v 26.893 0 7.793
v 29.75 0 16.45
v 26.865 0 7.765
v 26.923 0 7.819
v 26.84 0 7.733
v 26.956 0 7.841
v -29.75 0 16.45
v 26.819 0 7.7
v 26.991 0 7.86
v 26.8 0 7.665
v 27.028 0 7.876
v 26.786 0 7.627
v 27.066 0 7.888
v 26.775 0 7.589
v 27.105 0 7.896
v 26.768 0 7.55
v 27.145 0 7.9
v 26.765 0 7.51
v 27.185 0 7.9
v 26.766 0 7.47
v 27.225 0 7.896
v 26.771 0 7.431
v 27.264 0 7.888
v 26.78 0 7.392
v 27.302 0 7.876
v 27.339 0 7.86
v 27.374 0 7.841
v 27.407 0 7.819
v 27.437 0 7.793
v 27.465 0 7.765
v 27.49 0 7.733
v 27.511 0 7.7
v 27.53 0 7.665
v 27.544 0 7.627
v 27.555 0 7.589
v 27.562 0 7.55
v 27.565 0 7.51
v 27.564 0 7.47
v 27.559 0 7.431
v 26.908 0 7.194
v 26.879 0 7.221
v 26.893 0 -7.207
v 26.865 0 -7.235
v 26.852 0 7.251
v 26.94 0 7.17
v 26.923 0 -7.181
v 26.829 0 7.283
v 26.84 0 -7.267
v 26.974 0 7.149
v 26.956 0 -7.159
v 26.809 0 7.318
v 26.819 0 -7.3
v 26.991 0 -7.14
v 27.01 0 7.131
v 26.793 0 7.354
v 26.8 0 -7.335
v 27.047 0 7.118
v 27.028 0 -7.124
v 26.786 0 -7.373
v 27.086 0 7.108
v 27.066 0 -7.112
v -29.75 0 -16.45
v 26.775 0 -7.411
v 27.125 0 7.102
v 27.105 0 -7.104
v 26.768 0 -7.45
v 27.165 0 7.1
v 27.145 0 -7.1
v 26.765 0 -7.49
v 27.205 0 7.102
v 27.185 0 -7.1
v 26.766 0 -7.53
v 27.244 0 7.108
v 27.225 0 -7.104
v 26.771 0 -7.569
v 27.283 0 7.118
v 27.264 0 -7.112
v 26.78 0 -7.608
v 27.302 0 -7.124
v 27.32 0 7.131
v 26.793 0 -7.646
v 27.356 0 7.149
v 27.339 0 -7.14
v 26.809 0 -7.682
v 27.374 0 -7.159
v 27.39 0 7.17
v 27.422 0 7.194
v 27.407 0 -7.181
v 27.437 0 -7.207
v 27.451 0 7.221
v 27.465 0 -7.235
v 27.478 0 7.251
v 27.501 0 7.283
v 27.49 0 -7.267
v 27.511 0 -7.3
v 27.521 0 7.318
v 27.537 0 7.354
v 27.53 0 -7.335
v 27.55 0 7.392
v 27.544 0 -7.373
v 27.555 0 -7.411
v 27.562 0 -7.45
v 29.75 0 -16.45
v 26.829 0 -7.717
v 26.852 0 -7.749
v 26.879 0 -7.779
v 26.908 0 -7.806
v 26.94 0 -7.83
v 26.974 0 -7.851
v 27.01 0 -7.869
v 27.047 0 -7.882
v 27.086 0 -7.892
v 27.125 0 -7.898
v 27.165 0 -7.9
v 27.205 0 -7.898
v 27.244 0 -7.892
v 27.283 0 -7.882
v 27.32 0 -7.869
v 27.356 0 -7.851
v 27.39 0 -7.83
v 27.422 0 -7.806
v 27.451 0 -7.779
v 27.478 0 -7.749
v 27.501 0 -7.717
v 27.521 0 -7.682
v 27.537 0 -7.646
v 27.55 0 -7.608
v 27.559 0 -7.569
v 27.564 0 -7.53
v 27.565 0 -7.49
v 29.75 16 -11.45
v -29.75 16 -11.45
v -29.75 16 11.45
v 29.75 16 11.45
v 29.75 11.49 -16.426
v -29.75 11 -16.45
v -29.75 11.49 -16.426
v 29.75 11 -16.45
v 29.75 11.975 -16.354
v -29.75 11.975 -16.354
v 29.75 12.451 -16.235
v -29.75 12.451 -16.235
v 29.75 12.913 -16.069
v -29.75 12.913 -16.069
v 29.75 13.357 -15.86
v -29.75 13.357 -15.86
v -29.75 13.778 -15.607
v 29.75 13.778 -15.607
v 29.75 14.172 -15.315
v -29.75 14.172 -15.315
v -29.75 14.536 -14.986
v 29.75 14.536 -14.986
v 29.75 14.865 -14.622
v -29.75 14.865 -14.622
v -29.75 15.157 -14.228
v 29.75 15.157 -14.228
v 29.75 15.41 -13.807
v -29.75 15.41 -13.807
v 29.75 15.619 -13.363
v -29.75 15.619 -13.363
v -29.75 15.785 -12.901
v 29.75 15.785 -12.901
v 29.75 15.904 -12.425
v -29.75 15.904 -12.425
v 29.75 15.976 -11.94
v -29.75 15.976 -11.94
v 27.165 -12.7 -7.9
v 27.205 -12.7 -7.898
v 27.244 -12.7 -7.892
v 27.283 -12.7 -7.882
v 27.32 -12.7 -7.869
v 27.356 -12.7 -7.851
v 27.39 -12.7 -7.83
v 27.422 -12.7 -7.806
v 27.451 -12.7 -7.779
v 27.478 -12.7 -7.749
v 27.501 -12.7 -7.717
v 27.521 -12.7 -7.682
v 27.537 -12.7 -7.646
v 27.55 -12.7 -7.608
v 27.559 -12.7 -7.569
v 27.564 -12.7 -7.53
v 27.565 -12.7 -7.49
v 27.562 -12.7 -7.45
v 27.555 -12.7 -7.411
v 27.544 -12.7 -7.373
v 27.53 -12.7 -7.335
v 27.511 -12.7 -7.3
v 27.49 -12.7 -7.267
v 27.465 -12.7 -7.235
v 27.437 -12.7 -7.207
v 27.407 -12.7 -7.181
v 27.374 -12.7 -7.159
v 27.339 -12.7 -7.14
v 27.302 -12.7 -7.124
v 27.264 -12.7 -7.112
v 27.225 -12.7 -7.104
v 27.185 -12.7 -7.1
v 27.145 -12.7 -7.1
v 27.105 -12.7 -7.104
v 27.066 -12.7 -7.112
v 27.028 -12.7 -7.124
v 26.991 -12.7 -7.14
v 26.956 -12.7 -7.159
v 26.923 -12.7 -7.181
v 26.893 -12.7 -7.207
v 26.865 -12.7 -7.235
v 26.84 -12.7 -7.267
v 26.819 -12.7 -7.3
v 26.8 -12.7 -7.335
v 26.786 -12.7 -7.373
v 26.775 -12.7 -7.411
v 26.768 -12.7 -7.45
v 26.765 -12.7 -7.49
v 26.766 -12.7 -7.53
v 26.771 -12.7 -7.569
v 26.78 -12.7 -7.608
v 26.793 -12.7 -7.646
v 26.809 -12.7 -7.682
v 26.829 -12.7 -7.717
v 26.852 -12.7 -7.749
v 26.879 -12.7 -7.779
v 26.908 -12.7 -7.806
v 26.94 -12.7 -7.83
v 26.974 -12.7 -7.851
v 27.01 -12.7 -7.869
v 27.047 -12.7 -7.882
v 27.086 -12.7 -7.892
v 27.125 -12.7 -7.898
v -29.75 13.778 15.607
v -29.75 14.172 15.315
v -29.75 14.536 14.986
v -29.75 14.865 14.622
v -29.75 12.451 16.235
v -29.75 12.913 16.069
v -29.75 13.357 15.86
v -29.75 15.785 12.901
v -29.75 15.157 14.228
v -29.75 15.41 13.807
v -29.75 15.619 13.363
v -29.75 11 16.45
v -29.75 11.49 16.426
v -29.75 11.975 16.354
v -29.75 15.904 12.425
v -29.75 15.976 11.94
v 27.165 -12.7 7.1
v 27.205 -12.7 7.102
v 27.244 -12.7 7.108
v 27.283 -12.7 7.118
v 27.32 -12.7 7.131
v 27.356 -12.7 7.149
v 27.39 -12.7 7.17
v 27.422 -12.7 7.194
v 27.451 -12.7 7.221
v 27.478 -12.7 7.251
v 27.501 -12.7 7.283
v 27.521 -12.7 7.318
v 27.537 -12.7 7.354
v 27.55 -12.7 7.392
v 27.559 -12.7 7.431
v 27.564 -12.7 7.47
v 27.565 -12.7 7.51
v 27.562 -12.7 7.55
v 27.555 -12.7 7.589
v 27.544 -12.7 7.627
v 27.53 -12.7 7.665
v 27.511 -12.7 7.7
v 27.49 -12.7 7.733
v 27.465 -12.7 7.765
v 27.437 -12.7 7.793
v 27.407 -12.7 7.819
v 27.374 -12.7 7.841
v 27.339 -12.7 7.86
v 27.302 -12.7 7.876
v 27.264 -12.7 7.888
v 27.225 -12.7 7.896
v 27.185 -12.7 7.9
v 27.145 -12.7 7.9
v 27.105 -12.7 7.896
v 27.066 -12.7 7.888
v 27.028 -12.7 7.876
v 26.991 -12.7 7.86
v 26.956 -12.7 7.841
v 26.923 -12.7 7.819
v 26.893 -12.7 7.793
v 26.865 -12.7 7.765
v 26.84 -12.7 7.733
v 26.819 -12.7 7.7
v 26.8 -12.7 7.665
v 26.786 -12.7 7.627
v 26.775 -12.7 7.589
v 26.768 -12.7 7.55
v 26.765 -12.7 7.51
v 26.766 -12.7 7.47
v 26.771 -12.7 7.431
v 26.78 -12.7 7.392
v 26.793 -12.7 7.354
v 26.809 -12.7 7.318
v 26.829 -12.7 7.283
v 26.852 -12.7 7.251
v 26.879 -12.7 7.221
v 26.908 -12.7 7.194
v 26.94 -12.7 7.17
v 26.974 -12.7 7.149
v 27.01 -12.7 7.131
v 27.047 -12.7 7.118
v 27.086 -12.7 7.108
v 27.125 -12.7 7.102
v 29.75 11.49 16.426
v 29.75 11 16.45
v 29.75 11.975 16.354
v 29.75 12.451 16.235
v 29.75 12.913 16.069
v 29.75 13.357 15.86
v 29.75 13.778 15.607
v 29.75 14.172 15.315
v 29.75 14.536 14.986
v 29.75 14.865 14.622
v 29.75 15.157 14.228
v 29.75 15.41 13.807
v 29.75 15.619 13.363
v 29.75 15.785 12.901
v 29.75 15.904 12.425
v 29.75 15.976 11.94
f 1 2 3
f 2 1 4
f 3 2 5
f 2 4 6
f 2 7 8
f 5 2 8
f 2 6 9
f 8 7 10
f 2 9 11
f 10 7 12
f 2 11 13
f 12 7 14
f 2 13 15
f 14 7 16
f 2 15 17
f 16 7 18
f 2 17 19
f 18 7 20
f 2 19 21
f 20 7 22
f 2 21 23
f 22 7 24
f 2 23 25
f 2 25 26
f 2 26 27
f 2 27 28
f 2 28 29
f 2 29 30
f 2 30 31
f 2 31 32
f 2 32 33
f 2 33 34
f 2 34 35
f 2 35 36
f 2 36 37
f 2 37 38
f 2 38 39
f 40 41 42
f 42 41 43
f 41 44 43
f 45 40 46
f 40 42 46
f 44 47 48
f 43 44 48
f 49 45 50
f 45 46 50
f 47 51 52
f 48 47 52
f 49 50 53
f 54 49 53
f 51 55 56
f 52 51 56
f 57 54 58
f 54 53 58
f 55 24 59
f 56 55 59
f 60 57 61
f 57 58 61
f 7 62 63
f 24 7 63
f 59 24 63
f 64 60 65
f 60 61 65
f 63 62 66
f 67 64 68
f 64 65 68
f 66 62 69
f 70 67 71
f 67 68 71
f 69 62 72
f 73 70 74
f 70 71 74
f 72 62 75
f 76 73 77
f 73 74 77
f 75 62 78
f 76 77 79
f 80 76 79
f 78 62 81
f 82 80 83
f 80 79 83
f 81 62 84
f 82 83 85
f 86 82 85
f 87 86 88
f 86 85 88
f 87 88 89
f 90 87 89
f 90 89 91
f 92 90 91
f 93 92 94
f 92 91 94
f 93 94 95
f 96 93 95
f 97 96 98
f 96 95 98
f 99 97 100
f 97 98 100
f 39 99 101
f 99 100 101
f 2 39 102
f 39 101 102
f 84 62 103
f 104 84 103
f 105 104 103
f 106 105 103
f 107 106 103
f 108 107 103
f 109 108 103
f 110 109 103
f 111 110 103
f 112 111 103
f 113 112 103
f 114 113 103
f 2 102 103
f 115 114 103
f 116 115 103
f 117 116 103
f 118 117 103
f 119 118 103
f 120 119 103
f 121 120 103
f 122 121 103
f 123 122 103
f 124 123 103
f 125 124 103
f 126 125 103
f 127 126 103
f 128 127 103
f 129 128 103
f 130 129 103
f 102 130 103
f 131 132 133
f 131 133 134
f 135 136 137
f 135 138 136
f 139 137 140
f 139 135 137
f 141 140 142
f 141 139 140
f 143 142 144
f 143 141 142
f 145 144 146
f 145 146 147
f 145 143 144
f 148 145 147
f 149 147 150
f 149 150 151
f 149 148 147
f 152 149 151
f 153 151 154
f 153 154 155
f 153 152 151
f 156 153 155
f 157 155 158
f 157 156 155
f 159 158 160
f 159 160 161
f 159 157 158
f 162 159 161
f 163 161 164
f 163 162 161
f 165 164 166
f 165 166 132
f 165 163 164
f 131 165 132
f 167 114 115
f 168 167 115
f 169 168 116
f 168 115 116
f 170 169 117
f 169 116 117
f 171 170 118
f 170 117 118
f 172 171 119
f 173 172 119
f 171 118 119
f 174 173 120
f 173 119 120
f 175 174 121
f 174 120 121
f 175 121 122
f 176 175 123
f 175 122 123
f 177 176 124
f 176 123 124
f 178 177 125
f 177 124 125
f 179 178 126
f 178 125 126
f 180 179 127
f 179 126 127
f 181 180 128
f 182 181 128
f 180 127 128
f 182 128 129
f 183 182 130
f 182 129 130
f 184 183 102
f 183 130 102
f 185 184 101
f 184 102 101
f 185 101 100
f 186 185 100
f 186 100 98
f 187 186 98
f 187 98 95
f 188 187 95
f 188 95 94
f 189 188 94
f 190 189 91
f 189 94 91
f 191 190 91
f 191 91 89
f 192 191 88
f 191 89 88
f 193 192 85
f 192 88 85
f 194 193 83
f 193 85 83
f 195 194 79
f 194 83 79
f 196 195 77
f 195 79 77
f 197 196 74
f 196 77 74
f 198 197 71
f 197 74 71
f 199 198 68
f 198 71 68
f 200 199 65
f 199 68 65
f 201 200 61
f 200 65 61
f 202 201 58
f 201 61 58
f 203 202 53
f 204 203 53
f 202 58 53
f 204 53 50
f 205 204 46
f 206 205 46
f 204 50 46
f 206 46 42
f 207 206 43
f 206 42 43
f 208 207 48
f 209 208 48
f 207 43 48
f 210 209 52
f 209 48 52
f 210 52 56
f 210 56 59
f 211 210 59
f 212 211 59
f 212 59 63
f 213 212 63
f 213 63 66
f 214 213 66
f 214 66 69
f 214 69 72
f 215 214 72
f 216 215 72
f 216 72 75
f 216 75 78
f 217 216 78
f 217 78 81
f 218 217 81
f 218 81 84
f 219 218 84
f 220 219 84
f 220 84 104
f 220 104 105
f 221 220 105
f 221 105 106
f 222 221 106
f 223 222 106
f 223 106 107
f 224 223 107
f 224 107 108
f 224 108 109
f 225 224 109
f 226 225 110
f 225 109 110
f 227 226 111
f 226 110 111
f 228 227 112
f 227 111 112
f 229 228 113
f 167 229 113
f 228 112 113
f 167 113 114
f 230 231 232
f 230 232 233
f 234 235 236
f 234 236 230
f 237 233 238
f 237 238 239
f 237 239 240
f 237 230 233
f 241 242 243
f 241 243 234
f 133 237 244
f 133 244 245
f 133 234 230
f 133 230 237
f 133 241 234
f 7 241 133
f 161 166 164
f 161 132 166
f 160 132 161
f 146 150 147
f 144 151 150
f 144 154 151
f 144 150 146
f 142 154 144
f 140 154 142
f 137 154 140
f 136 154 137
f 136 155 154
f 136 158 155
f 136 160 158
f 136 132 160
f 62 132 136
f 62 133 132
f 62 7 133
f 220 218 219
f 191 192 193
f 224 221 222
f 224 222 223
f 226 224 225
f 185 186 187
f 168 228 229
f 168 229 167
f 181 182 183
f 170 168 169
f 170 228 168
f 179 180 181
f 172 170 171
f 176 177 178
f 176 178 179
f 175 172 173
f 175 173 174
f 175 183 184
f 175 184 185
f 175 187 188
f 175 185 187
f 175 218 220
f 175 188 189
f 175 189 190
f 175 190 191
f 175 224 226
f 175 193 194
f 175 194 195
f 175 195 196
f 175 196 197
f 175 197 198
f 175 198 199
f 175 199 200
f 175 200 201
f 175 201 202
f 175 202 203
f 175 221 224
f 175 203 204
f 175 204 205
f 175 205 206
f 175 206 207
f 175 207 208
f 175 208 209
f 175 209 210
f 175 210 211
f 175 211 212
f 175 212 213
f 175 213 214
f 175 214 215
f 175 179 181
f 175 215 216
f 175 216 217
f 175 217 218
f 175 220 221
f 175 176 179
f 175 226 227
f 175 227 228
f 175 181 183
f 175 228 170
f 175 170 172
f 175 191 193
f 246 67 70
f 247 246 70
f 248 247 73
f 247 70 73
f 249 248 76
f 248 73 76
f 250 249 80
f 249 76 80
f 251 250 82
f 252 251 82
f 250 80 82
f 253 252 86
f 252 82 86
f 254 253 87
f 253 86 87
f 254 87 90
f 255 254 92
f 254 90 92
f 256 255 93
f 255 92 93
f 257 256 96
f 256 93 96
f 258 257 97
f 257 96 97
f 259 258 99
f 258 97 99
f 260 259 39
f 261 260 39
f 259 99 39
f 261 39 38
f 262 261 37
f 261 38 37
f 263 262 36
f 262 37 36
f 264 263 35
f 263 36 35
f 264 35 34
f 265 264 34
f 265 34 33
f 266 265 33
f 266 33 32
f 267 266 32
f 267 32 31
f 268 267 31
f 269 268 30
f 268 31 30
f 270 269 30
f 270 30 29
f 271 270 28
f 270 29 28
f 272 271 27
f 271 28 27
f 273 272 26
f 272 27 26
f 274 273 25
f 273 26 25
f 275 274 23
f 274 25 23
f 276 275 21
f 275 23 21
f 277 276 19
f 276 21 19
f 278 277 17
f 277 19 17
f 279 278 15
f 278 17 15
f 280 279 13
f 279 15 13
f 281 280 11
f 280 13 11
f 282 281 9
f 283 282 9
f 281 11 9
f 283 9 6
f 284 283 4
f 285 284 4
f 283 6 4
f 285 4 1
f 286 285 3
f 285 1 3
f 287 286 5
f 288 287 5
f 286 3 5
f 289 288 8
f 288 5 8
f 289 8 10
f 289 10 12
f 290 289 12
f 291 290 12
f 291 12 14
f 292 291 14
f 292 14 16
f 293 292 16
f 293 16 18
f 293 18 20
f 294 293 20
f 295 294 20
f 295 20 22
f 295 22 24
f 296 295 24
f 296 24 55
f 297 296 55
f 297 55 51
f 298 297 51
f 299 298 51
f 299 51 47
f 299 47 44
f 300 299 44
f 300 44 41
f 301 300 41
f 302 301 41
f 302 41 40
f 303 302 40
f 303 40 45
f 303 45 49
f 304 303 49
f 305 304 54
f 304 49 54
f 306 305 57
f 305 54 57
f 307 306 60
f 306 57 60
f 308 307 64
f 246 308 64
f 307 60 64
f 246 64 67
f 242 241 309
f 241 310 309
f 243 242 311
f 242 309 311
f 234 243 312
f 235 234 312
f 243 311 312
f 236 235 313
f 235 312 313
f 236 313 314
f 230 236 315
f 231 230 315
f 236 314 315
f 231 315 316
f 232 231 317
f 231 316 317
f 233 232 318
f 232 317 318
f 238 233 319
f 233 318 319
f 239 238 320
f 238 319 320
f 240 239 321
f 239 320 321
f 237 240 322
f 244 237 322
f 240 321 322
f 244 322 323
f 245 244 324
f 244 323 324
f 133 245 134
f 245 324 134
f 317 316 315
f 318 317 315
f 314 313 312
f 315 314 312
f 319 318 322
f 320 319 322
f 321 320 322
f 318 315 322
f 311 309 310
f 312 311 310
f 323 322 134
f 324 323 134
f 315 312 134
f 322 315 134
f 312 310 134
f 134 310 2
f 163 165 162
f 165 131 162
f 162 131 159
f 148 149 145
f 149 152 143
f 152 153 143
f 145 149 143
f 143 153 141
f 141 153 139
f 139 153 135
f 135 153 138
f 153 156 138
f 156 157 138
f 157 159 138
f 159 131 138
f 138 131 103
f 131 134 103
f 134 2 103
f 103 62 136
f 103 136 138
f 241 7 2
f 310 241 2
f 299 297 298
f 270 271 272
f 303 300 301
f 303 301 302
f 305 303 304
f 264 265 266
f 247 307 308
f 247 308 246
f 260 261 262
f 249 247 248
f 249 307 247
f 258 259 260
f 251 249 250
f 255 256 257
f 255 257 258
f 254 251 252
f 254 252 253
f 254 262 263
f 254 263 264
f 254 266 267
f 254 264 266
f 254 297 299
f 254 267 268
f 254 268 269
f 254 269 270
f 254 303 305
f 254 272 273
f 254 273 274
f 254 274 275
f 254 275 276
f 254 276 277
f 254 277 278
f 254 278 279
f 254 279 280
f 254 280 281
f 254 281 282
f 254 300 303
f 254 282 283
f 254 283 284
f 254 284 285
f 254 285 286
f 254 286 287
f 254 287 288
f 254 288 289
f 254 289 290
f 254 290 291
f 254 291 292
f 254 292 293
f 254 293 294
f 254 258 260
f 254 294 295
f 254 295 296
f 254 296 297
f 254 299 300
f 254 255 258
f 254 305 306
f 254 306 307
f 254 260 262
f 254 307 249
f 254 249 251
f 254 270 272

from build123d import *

# Parameters (mm, degrees)
SKETCH1_W           = 59.5
SKETCH1_H           = 32.9
BOSS_EXTRUDE1_DEPTH = 16
FILLET1_R           = 5
SKETCH2_R           = 0.4
BOSS_EXTRUDE2_DEPTH = 12.7


with BuildPart() as part:
    # Sketch1 → Boss-Extrude1 (new body)
    with BuildSketch(Plane(origin=(0, 0, 0), x_dir=(1, 0, 0), z_dir=(0, 1, 0))):
        Rectangle(SKETCH1_W, SKETCH1_H)
    extrude(amount=BOSS_EXTRUDE1_DEPTH)

    # Fillet1
    fillet1_edges = [part.edges().sort_by_distance(p)[0] for p in [
        (0, 16, 16.45),
        (0, 16, -16.45),
    ]]
    fillet(fillet1_edges, radius=FILLET1_R)

    # Sketch2 → Boss-Extrude2 (add)
    with BuildSketch(Plane.XZ):
        with Locations(Location((27.165, 7.5, 0), (0, 0, 270))):
            Circle(SKETCH2_R)
        with Locations(Location((27.165, -7.5, 0), (0, 0, 270))):
            Circle(SKETCH2_R)
    extrude(amount=BOSS_EXTRUDE2_DEPTH)


solid = part.part
